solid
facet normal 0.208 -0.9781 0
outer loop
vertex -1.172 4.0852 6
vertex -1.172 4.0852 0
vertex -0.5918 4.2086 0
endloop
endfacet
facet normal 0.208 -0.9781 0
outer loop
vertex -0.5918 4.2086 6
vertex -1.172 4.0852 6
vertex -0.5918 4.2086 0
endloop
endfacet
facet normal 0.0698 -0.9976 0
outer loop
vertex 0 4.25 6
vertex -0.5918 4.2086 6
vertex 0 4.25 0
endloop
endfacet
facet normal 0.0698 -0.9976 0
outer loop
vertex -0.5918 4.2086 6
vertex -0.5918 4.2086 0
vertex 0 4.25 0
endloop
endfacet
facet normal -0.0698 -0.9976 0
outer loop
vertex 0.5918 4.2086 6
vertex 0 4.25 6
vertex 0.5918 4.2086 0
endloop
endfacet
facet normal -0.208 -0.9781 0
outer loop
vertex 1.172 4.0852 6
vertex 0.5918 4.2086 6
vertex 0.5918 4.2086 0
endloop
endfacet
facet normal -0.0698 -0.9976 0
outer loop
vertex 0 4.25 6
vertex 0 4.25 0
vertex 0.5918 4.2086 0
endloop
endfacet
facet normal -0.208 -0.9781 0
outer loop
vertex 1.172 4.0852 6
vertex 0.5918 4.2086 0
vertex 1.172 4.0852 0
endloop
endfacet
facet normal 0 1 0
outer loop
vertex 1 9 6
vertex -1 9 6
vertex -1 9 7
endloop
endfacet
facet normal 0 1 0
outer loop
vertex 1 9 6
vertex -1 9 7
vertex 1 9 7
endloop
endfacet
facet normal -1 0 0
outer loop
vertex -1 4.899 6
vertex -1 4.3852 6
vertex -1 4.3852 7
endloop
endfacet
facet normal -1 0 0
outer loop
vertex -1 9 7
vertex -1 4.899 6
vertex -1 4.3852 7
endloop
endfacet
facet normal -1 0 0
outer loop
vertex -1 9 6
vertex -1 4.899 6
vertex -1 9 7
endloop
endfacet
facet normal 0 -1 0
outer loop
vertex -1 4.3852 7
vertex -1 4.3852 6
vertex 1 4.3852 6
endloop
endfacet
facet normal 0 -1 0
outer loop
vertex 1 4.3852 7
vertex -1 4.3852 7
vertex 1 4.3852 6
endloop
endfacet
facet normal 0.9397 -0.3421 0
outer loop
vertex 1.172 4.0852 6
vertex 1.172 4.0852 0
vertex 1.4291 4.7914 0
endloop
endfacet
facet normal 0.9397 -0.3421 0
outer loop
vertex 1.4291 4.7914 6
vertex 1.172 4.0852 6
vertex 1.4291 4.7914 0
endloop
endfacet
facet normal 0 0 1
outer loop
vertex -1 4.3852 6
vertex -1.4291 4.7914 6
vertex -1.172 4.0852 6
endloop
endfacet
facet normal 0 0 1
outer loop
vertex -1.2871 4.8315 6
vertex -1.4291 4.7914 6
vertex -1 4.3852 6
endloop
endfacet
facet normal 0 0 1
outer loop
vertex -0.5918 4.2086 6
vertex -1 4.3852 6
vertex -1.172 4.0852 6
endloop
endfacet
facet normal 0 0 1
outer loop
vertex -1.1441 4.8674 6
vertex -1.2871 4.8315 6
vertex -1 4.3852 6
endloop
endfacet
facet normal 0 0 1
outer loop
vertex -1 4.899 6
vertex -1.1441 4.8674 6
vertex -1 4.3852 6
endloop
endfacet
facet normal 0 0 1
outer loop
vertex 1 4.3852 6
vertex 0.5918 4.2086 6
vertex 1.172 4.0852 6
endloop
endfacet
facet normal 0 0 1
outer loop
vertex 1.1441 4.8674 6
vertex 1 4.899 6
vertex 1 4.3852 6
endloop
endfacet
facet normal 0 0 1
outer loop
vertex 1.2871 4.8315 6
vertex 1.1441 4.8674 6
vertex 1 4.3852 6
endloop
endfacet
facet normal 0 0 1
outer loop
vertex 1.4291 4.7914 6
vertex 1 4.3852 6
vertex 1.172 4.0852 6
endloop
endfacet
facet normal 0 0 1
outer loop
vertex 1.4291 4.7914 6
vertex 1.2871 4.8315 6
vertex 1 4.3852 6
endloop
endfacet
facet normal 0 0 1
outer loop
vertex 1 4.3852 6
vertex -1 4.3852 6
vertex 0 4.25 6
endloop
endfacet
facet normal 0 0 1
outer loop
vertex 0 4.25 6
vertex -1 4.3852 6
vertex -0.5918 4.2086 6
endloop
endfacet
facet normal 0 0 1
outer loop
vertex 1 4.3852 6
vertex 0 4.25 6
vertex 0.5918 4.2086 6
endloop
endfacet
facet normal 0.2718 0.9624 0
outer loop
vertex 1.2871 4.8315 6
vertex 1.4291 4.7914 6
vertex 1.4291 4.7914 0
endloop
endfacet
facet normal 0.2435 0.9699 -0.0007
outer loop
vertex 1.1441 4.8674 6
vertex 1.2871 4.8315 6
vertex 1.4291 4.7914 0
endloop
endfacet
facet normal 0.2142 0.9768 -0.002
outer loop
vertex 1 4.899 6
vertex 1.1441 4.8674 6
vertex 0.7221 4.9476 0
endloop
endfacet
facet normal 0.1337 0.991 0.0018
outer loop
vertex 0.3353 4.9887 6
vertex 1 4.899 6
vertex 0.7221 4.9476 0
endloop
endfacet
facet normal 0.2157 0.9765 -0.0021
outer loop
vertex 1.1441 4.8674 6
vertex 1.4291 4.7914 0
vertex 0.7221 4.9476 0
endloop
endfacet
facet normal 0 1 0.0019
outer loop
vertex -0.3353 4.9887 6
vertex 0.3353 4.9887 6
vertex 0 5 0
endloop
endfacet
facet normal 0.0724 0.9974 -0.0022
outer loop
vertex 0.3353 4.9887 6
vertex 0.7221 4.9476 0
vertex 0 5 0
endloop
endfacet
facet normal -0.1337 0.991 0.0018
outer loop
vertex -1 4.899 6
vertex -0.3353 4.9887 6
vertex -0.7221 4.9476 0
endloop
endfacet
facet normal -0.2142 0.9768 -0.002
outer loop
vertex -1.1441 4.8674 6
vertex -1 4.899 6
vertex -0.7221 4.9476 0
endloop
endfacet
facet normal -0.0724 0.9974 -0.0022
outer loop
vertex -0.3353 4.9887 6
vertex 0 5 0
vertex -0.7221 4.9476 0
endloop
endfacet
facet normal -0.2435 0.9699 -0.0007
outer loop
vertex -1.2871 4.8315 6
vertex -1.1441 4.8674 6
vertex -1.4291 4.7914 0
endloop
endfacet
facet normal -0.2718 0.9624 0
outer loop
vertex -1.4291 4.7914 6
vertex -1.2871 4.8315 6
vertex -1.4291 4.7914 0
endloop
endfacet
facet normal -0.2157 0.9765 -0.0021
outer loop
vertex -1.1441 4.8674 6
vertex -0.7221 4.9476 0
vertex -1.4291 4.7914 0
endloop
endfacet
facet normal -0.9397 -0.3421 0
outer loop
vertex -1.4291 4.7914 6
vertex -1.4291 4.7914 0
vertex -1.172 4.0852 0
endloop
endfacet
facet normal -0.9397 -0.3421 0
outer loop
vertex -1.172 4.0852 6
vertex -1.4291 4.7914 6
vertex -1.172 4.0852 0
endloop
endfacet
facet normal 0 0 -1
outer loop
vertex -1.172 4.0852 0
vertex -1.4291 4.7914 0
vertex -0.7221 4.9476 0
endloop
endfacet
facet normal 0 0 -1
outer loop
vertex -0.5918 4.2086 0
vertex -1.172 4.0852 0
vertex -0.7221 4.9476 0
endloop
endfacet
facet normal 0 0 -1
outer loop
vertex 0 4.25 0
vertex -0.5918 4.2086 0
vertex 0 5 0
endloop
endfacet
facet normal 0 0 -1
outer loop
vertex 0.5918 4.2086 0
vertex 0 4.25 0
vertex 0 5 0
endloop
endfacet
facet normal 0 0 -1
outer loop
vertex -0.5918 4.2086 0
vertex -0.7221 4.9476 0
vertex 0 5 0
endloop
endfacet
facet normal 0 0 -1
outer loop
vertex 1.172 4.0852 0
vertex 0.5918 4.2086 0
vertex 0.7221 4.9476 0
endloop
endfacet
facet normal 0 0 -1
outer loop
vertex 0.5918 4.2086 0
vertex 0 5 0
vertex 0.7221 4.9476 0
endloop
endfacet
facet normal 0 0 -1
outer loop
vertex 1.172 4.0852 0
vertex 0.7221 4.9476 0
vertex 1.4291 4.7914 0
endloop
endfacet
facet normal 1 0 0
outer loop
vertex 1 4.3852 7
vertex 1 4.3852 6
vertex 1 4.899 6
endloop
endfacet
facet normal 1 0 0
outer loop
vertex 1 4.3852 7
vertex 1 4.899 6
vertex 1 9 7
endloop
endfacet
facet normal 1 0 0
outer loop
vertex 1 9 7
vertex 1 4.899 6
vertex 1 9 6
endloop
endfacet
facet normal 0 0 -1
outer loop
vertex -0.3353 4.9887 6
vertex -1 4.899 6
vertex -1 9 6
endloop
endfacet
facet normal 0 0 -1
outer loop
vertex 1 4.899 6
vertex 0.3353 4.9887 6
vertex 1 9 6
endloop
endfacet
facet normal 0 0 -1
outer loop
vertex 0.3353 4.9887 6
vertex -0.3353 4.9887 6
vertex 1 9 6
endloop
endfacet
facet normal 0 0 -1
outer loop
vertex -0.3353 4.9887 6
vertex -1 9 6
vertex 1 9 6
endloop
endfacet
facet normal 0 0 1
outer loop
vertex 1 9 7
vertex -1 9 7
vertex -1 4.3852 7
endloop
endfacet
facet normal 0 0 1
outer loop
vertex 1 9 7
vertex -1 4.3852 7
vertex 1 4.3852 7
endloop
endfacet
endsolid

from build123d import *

# Parameters (mm, degrees)
BASE_EXTRUSION_DEPTH = 6
ESQUISSE2_W          = 2
ESQUISSE2_H          = 4.614800239
BOSS_EXTRU_1_DEPTH   = 1


with BuildPart() as part:
    # Esquisse1 → Base-Extrusion (new body)
    with BuildSketch(Plane.XY):
        with BuildLine():
            Line((-1.429070273, 4.791425482), (-1.172025132, 4.085199761))
            ThreePointArc((-1.172025132, 4.085199761), (0, 4.25), (1.172025132, 4.085199761))
            Line((1.172025132, 4.085199761), (1.429070273, 4.791425482))
            ThreePointArc((1.429070273, 4.791425482), (0, 5), (-1.429070273, 4.791425482))
        make_face()
    extrude(amount=BASE_EXTRUSION_DEPTH)

    # Esquisse2 → Boss.-Extru.1 (add)
    with BuildSketch(Plane.XY.offset(6)):
        with Locations((0, 6.69259988)):
            Rectangle(ESQUISSE2_W, ESQUISSE2_H)
    extrude(amount=BOSS_EXTRU_1_DEPTH)


solid = part.part
